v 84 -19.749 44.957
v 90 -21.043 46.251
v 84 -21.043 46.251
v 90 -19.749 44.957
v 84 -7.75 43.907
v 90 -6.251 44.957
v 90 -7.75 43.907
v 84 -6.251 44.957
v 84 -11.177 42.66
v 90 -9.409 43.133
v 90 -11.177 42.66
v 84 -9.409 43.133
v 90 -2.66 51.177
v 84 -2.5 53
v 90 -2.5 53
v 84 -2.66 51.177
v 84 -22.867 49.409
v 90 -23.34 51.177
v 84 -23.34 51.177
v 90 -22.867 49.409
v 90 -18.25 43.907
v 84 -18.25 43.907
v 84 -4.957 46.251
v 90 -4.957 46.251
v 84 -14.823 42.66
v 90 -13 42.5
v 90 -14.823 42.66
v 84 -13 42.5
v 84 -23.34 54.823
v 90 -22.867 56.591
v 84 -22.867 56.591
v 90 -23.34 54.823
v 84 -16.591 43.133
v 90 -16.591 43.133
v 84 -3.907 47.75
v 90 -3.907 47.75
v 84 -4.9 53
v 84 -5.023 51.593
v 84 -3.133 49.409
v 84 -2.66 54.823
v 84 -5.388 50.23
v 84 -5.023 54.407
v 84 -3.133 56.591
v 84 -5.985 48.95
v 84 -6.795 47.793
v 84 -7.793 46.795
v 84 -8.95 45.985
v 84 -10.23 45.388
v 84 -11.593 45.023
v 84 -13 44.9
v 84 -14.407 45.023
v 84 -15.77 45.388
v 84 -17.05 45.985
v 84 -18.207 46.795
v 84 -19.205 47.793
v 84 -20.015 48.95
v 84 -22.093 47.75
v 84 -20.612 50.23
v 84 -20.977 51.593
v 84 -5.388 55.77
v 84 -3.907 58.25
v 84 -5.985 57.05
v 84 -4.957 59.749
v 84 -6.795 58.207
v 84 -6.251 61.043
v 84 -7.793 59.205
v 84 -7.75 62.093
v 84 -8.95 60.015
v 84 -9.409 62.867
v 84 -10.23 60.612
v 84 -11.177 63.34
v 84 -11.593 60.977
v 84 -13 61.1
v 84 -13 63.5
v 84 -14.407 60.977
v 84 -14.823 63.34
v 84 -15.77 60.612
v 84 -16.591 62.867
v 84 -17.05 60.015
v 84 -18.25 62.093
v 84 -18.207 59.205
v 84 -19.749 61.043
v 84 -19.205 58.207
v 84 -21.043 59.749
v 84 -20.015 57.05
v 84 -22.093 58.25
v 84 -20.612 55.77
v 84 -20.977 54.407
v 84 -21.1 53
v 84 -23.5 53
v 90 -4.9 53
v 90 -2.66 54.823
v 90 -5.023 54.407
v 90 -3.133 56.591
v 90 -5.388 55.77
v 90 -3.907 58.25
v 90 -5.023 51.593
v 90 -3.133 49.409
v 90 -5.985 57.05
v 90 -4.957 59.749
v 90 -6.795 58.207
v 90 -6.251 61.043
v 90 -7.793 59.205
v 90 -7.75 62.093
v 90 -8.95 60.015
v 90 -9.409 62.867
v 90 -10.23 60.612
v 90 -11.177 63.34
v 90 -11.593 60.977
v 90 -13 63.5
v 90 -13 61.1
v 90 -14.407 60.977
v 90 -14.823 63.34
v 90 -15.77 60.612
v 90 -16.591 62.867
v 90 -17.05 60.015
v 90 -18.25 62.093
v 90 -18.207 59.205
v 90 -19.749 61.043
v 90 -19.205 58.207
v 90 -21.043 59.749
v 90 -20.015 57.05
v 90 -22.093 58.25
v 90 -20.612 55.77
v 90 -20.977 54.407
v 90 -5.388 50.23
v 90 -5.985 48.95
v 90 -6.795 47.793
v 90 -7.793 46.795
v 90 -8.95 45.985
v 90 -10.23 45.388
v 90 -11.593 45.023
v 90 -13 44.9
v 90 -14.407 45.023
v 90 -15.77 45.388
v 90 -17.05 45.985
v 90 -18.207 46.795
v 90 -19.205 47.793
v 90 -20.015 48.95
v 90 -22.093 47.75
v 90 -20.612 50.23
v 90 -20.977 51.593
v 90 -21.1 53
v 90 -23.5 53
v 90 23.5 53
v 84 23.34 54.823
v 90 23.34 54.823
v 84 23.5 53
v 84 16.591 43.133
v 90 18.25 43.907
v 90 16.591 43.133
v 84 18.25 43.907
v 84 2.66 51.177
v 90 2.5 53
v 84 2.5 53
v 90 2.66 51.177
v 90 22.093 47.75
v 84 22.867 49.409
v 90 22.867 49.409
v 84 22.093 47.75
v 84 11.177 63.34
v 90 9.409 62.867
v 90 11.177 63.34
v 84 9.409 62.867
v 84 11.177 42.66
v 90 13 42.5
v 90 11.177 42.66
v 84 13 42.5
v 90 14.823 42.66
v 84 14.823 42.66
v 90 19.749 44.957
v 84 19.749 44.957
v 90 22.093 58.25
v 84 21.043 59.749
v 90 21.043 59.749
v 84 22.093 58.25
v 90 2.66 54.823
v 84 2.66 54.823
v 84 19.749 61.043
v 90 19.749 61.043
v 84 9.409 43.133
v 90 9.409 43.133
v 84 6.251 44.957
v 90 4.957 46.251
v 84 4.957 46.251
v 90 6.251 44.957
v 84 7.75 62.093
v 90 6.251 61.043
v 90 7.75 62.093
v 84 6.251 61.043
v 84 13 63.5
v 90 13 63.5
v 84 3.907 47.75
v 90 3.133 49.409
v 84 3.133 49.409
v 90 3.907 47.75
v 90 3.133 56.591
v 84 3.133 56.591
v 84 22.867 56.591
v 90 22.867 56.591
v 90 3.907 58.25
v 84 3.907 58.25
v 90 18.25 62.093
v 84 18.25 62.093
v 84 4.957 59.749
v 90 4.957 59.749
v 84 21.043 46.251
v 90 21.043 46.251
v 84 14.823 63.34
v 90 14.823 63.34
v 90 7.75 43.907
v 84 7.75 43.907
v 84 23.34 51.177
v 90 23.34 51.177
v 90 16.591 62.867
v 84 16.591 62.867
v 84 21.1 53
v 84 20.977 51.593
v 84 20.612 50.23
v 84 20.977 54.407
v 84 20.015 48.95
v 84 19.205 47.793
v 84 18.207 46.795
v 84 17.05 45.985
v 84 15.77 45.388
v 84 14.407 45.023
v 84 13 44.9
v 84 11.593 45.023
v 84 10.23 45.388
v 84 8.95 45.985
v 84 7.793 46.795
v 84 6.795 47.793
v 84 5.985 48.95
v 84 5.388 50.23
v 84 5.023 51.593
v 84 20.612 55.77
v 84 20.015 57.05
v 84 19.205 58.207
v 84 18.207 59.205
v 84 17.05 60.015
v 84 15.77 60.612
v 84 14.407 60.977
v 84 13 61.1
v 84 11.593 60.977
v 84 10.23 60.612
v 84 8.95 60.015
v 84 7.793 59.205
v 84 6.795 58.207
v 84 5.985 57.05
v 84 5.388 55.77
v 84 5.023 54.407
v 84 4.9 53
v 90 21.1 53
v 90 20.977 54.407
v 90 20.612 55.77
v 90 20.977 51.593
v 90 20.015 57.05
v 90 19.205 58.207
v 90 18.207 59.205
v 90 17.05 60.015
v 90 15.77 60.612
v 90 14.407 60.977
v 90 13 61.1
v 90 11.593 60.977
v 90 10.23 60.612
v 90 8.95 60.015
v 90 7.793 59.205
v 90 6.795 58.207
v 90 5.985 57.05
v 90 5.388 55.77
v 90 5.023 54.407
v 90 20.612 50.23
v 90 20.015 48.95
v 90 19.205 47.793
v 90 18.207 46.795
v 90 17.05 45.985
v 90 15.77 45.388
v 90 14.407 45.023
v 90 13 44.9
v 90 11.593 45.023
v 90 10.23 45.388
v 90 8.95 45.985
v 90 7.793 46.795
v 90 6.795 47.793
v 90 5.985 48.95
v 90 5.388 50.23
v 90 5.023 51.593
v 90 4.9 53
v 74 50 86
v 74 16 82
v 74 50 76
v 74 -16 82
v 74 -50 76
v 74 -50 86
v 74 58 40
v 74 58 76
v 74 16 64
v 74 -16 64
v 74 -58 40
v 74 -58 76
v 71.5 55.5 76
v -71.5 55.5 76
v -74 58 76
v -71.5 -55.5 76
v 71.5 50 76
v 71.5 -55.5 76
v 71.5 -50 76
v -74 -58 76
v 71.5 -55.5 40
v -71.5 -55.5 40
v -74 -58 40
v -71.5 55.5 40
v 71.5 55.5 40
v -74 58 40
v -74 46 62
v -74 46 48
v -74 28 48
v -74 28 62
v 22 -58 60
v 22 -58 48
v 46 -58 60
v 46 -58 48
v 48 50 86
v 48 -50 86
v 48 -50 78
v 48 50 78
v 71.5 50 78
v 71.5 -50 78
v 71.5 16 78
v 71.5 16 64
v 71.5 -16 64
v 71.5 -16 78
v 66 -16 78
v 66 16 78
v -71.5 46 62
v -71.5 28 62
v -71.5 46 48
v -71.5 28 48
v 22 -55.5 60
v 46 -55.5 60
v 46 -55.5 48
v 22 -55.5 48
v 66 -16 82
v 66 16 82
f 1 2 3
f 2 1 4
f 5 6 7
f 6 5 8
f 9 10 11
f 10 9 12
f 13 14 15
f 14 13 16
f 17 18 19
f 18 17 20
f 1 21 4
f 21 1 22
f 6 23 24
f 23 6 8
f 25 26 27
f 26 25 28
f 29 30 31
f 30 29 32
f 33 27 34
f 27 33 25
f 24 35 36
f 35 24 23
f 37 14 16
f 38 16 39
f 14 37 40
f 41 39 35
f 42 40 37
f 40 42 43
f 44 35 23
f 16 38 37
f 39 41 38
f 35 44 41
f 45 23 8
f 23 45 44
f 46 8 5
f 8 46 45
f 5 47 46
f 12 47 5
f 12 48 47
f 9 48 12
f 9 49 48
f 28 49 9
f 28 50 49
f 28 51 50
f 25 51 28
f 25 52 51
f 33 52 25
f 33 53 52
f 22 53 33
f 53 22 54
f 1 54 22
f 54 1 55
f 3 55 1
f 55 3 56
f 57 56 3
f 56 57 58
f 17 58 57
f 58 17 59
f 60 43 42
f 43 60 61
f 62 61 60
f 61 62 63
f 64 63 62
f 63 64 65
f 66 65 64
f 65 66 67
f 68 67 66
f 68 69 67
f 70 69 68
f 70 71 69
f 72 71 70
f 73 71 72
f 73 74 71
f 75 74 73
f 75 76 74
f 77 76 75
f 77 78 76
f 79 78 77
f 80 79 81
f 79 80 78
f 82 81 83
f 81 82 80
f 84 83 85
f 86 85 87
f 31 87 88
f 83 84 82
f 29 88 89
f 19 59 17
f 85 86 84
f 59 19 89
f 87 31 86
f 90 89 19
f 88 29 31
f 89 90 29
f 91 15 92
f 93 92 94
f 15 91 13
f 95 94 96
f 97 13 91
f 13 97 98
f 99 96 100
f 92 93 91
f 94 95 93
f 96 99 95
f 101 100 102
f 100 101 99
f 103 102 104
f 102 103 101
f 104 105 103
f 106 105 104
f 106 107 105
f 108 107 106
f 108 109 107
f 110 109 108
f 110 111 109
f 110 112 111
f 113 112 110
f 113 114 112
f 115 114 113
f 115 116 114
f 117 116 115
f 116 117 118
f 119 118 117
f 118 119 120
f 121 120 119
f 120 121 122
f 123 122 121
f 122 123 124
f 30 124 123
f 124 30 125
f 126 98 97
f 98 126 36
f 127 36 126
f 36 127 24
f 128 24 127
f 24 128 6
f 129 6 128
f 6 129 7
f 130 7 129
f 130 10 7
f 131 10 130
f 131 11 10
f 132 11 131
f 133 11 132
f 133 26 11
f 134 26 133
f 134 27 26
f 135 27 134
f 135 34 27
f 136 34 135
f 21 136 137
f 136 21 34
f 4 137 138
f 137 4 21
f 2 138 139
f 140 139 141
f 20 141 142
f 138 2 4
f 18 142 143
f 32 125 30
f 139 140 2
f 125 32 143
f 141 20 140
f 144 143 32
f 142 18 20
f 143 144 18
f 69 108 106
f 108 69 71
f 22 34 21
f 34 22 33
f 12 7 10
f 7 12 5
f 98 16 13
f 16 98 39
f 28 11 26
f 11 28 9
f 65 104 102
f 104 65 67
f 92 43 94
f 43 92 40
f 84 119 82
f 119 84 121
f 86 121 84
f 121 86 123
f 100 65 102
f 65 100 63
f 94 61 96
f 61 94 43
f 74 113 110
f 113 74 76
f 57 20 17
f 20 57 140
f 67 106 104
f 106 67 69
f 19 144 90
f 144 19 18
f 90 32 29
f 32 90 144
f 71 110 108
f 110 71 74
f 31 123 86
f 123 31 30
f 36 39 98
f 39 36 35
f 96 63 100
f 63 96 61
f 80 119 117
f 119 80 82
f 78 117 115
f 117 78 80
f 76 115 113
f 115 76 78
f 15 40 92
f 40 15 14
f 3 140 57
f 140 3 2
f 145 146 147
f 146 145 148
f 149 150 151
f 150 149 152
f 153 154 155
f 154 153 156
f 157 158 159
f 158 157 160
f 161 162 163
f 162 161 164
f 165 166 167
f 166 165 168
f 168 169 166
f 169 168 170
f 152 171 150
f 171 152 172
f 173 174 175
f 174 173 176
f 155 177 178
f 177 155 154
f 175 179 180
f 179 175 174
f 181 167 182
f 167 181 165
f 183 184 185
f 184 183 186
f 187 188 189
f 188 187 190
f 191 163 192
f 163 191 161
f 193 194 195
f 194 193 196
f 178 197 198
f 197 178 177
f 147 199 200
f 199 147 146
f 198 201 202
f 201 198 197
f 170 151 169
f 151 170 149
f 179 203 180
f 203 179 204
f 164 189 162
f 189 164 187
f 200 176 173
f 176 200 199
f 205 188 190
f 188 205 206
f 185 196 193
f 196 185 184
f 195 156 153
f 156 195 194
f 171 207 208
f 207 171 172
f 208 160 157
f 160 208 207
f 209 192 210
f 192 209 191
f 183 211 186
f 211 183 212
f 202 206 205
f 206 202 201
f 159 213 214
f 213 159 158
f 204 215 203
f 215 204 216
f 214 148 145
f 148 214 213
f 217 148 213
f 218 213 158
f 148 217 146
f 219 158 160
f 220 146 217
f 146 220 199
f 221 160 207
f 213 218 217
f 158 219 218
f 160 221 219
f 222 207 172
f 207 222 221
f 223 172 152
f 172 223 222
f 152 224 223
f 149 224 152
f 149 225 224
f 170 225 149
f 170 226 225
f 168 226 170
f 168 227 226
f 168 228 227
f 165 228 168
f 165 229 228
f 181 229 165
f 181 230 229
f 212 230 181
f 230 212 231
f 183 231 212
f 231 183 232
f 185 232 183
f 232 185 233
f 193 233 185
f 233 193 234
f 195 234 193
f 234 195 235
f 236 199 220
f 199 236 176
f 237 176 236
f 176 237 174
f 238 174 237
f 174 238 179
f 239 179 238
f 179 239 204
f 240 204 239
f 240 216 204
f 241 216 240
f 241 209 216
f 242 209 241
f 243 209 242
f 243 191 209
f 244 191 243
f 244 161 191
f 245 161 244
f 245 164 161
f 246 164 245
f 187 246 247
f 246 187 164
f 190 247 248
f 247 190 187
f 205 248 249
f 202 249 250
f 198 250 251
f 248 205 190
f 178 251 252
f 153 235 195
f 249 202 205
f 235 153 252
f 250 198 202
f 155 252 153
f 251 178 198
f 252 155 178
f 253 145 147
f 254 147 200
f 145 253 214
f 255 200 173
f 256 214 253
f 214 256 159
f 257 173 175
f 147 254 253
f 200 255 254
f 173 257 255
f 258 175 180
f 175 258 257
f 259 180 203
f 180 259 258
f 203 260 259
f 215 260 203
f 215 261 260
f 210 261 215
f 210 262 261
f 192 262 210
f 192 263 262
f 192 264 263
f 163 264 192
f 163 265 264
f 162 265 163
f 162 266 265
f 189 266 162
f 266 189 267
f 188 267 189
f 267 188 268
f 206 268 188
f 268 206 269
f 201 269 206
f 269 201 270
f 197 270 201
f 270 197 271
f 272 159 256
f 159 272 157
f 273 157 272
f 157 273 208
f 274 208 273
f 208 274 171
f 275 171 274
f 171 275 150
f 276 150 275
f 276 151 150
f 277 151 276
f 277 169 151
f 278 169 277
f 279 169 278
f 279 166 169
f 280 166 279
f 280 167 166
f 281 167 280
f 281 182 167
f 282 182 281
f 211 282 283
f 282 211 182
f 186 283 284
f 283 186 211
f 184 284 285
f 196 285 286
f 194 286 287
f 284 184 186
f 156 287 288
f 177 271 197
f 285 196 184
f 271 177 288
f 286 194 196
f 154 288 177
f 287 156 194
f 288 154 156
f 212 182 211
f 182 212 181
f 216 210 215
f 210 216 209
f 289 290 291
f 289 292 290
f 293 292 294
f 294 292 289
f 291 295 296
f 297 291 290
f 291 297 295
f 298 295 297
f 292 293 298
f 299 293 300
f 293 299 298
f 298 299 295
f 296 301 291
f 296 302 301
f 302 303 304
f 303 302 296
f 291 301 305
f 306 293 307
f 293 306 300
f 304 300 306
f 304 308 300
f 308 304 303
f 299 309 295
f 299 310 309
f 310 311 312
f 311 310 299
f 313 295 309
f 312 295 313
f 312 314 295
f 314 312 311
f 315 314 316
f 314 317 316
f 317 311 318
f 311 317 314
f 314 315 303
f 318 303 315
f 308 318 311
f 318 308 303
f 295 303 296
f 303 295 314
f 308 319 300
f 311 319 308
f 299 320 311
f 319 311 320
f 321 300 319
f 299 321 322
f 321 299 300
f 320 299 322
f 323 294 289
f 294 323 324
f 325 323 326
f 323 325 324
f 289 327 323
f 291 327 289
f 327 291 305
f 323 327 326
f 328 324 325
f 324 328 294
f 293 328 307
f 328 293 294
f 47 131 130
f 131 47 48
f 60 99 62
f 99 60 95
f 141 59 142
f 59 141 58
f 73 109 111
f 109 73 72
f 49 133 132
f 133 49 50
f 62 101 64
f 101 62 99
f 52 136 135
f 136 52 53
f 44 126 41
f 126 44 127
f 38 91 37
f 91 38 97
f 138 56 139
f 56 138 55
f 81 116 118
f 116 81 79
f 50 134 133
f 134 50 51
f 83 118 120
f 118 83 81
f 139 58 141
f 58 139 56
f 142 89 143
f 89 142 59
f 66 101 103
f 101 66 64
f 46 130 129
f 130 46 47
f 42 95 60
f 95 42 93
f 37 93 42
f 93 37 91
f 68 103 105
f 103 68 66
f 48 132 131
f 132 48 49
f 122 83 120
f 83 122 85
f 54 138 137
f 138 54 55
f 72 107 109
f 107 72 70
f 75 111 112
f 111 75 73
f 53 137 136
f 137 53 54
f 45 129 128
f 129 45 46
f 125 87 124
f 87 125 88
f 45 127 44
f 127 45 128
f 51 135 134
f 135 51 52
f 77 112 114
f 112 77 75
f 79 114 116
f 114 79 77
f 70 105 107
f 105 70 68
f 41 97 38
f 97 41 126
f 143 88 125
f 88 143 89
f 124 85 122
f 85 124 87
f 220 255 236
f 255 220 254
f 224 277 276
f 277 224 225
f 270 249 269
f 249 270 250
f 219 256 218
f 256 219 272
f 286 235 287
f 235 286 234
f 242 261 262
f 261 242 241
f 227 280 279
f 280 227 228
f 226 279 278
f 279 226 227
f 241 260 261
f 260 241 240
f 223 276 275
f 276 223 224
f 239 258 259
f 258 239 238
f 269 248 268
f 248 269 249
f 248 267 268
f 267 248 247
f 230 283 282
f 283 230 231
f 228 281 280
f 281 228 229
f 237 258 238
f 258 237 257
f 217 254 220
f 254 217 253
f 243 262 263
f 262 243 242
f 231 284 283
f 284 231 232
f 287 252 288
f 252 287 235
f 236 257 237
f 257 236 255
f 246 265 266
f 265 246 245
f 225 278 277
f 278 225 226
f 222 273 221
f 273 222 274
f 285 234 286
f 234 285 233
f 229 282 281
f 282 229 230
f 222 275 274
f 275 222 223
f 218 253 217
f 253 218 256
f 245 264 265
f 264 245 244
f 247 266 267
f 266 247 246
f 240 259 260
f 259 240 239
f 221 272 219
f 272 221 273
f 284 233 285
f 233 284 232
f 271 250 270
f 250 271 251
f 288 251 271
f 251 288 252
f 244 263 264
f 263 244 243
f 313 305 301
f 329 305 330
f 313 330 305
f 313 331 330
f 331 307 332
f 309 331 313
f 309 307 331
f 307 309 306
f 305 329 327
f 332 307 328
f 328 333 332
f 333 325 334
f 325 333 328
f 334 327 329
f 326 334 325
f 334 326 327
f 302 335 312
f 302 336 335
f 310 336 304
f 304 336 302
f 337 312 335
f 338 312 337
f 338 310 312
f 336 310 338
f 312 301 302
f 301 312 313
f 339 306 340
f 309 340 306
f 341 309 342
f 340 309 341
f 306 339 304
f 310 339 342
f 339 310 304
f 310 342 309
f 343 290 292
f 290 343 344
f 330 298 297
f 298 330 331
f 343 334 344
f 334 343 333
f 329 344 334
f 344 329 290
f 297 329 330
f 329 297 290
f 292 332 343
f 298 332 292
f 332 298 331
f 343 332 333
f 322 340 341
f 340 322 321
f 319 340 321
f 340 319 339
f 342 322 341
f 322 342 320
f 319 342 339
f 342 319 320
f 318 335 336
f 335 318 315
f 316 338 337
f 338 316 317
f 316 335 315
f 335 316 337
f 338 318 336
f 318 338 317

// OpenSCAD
// file: cyber_parameters.scad
// ============================================================================
// cute-esp32-lego-car / cad / cyber-print / cyber_parameters.scad
// 拓竹 A1 3D打印机赛博黑透战术探索版参数化核心尺寸库 (单位: mm)
// ============================================================================

$fn = 36;

// 1. 机电驱动与车轮参数 (基于订单 Row 18/23/38 实物核算)
wheel_diameter       = 34.0;  // ZJ327 橡胶轮外径 34.0mm
wheel_tire_width     = 7.0;   // 胎面宽 7.0mm
wheel_hub_width      = 9.5;   // 轮毂总厚 9.5mm (含内侧码盘凸台)
wheel_axle_dia       = 3.0;   // 3mm D型轴
wheel_axle_z         = 17.0;  // 轮轴中心距地高 17.0mm (= 34/2 完美同心)
ground_clearance     = 9.0;   // 底盘最低离地间隙 9.0mm

// 1812-N20 蜗轮蜗杆减速电机 (6V 190RPM 速比42 纵向安装)
n20_gearbox_l        = 18.0;  // 1812 蜗轮箱长
n20_motor_l          = 15.0;  // 电机筒长
n20_total_l          = 33.0;  // 电机总长
n20_width            = 12.0;  // 机身宽
n20_height           = 10.0;  // 机身高
n20_shaft_offset_x   = 6.0;   // 轴距齿轮箱前缘距离

// 2. 关键几何布局 (针对蜗轮自锁差速转向优化)
wheelbase            = 90.0;  // 前后轴距 90.0mm (前轴 +45mm, 后轴 -45mm)
track_width          = 107.5; // 左右轮胎中心距 107.5mm
ratio_wb_tw          = wheelbase / track_width; // 0.837 差速转向黄金比

// 3. 2S 18650 电池仓与电子托盘
bat_bay_l            = 76.0;  // 电池仓净内长
bat_bay_w            = 41.0;  // 电池仓净内宽
bat_bay_h            = 16.0;  // 电池仓槽深

// 4. 电子板安装孔距
esp32_hole_x         = 60.0;  // 38Pin 扩展板长向孔距
esp32_hole_y         = 47.0;  // 38Pin 扩展板宽向孔距
l298n_hole_pitch     = 37.0;  // L298N 驱动板 37x37mm 标准孔距
lm2596_hole_dist     = 31.0;  // LM2596S 对角孔距

// 5. 3D 打印配合与公差设计 (拓竹 A1 级精度)
m3_heatset_hole_dia  = 4.0;   // M3 热熔铜螺母预留底孔 Ø4.0mm
m3_pass_hole_dia     = 3.4;   // M3 穿钉过孔 Ø3.4mm
magnet_dia           = 4.2;   // Ø4x2mm 磁铁嵌入槽孔径
magnet_depth         = 2.2;   // 磁铁沉槽深度
min_wall_thickness   = 2.0;   // 结构外壁最小厚度
chamfer_angle        = 45.0;  // 45° 无支撑自支撑斜角
// main file
// ============================================================================
// Part 3: 赛博机能黑透主车壳 (Cyber Armor Body Shell)
// ============================================================================
include <cyber_parameters.scad>

module cyber_armor_shell() {
    difference() {
        union() {
            // 主车体下裙 (148 x 116 x 36 mm, Z=40.0~76.0)
            translate([-74, -58, 40.0])
                cube([148, 116, 36.0]);
            // 前倾战术 Visor (OLED 表情屏视窗框架)
            translate([48, -50, 60.0])
                cube([26, 100, 26.0]);
            // 前超声波加农炮筒护圈
            for (py = [-13.0, 13.0]) {
                translate([84.0, py, 53.0])
                rotate([0, 90, 0])
                    cylinder(d = 21.0, h = 6.0);
            }
        }

        // 掏空内腔 (内部空腔包容电子托盘与模块)
        translate([-71.5, -55.5, 38.0])
            cube([143, 111, 40.0]);

        // 前脸双超声波探头开孔 (Ø16.2mm)
        for (py = [-13.0, 13.0]) {
            translate([80.0, py, 53.0])
            rotate([0, 90, 0])
                cylinder(d = 16.2, h = 15.0);
        }

        // 前 OLED HUD 视窗开孔 (32 x 18 mm)
        translate([66.0, -16.0, 64.0])
            cube([15.0, 32.0, 18.0]);

        // 右侧 Type-C 检修接口开孔
        translate([22.0, -60.0, 48.0])
            cube([24.0, 10.0, 12.0]);

        // 车尾 KCD11 开关与充电口开孔
        translate([-78.0, 28.0, 48.0])
            cube([10.0, 18.0, 14.0]);

        // 车顶 4 角磁铁嵌入槽 (Ø4.2 x 2.2mm)
        for (rx = [42, -64], ry = [38, -38]) {
            translate([rx, ry, 74.0])
                cylinder(d = magnet_dia, h = magnet_depth + 1);
        }
    }
}

cyber_armor_shell();
